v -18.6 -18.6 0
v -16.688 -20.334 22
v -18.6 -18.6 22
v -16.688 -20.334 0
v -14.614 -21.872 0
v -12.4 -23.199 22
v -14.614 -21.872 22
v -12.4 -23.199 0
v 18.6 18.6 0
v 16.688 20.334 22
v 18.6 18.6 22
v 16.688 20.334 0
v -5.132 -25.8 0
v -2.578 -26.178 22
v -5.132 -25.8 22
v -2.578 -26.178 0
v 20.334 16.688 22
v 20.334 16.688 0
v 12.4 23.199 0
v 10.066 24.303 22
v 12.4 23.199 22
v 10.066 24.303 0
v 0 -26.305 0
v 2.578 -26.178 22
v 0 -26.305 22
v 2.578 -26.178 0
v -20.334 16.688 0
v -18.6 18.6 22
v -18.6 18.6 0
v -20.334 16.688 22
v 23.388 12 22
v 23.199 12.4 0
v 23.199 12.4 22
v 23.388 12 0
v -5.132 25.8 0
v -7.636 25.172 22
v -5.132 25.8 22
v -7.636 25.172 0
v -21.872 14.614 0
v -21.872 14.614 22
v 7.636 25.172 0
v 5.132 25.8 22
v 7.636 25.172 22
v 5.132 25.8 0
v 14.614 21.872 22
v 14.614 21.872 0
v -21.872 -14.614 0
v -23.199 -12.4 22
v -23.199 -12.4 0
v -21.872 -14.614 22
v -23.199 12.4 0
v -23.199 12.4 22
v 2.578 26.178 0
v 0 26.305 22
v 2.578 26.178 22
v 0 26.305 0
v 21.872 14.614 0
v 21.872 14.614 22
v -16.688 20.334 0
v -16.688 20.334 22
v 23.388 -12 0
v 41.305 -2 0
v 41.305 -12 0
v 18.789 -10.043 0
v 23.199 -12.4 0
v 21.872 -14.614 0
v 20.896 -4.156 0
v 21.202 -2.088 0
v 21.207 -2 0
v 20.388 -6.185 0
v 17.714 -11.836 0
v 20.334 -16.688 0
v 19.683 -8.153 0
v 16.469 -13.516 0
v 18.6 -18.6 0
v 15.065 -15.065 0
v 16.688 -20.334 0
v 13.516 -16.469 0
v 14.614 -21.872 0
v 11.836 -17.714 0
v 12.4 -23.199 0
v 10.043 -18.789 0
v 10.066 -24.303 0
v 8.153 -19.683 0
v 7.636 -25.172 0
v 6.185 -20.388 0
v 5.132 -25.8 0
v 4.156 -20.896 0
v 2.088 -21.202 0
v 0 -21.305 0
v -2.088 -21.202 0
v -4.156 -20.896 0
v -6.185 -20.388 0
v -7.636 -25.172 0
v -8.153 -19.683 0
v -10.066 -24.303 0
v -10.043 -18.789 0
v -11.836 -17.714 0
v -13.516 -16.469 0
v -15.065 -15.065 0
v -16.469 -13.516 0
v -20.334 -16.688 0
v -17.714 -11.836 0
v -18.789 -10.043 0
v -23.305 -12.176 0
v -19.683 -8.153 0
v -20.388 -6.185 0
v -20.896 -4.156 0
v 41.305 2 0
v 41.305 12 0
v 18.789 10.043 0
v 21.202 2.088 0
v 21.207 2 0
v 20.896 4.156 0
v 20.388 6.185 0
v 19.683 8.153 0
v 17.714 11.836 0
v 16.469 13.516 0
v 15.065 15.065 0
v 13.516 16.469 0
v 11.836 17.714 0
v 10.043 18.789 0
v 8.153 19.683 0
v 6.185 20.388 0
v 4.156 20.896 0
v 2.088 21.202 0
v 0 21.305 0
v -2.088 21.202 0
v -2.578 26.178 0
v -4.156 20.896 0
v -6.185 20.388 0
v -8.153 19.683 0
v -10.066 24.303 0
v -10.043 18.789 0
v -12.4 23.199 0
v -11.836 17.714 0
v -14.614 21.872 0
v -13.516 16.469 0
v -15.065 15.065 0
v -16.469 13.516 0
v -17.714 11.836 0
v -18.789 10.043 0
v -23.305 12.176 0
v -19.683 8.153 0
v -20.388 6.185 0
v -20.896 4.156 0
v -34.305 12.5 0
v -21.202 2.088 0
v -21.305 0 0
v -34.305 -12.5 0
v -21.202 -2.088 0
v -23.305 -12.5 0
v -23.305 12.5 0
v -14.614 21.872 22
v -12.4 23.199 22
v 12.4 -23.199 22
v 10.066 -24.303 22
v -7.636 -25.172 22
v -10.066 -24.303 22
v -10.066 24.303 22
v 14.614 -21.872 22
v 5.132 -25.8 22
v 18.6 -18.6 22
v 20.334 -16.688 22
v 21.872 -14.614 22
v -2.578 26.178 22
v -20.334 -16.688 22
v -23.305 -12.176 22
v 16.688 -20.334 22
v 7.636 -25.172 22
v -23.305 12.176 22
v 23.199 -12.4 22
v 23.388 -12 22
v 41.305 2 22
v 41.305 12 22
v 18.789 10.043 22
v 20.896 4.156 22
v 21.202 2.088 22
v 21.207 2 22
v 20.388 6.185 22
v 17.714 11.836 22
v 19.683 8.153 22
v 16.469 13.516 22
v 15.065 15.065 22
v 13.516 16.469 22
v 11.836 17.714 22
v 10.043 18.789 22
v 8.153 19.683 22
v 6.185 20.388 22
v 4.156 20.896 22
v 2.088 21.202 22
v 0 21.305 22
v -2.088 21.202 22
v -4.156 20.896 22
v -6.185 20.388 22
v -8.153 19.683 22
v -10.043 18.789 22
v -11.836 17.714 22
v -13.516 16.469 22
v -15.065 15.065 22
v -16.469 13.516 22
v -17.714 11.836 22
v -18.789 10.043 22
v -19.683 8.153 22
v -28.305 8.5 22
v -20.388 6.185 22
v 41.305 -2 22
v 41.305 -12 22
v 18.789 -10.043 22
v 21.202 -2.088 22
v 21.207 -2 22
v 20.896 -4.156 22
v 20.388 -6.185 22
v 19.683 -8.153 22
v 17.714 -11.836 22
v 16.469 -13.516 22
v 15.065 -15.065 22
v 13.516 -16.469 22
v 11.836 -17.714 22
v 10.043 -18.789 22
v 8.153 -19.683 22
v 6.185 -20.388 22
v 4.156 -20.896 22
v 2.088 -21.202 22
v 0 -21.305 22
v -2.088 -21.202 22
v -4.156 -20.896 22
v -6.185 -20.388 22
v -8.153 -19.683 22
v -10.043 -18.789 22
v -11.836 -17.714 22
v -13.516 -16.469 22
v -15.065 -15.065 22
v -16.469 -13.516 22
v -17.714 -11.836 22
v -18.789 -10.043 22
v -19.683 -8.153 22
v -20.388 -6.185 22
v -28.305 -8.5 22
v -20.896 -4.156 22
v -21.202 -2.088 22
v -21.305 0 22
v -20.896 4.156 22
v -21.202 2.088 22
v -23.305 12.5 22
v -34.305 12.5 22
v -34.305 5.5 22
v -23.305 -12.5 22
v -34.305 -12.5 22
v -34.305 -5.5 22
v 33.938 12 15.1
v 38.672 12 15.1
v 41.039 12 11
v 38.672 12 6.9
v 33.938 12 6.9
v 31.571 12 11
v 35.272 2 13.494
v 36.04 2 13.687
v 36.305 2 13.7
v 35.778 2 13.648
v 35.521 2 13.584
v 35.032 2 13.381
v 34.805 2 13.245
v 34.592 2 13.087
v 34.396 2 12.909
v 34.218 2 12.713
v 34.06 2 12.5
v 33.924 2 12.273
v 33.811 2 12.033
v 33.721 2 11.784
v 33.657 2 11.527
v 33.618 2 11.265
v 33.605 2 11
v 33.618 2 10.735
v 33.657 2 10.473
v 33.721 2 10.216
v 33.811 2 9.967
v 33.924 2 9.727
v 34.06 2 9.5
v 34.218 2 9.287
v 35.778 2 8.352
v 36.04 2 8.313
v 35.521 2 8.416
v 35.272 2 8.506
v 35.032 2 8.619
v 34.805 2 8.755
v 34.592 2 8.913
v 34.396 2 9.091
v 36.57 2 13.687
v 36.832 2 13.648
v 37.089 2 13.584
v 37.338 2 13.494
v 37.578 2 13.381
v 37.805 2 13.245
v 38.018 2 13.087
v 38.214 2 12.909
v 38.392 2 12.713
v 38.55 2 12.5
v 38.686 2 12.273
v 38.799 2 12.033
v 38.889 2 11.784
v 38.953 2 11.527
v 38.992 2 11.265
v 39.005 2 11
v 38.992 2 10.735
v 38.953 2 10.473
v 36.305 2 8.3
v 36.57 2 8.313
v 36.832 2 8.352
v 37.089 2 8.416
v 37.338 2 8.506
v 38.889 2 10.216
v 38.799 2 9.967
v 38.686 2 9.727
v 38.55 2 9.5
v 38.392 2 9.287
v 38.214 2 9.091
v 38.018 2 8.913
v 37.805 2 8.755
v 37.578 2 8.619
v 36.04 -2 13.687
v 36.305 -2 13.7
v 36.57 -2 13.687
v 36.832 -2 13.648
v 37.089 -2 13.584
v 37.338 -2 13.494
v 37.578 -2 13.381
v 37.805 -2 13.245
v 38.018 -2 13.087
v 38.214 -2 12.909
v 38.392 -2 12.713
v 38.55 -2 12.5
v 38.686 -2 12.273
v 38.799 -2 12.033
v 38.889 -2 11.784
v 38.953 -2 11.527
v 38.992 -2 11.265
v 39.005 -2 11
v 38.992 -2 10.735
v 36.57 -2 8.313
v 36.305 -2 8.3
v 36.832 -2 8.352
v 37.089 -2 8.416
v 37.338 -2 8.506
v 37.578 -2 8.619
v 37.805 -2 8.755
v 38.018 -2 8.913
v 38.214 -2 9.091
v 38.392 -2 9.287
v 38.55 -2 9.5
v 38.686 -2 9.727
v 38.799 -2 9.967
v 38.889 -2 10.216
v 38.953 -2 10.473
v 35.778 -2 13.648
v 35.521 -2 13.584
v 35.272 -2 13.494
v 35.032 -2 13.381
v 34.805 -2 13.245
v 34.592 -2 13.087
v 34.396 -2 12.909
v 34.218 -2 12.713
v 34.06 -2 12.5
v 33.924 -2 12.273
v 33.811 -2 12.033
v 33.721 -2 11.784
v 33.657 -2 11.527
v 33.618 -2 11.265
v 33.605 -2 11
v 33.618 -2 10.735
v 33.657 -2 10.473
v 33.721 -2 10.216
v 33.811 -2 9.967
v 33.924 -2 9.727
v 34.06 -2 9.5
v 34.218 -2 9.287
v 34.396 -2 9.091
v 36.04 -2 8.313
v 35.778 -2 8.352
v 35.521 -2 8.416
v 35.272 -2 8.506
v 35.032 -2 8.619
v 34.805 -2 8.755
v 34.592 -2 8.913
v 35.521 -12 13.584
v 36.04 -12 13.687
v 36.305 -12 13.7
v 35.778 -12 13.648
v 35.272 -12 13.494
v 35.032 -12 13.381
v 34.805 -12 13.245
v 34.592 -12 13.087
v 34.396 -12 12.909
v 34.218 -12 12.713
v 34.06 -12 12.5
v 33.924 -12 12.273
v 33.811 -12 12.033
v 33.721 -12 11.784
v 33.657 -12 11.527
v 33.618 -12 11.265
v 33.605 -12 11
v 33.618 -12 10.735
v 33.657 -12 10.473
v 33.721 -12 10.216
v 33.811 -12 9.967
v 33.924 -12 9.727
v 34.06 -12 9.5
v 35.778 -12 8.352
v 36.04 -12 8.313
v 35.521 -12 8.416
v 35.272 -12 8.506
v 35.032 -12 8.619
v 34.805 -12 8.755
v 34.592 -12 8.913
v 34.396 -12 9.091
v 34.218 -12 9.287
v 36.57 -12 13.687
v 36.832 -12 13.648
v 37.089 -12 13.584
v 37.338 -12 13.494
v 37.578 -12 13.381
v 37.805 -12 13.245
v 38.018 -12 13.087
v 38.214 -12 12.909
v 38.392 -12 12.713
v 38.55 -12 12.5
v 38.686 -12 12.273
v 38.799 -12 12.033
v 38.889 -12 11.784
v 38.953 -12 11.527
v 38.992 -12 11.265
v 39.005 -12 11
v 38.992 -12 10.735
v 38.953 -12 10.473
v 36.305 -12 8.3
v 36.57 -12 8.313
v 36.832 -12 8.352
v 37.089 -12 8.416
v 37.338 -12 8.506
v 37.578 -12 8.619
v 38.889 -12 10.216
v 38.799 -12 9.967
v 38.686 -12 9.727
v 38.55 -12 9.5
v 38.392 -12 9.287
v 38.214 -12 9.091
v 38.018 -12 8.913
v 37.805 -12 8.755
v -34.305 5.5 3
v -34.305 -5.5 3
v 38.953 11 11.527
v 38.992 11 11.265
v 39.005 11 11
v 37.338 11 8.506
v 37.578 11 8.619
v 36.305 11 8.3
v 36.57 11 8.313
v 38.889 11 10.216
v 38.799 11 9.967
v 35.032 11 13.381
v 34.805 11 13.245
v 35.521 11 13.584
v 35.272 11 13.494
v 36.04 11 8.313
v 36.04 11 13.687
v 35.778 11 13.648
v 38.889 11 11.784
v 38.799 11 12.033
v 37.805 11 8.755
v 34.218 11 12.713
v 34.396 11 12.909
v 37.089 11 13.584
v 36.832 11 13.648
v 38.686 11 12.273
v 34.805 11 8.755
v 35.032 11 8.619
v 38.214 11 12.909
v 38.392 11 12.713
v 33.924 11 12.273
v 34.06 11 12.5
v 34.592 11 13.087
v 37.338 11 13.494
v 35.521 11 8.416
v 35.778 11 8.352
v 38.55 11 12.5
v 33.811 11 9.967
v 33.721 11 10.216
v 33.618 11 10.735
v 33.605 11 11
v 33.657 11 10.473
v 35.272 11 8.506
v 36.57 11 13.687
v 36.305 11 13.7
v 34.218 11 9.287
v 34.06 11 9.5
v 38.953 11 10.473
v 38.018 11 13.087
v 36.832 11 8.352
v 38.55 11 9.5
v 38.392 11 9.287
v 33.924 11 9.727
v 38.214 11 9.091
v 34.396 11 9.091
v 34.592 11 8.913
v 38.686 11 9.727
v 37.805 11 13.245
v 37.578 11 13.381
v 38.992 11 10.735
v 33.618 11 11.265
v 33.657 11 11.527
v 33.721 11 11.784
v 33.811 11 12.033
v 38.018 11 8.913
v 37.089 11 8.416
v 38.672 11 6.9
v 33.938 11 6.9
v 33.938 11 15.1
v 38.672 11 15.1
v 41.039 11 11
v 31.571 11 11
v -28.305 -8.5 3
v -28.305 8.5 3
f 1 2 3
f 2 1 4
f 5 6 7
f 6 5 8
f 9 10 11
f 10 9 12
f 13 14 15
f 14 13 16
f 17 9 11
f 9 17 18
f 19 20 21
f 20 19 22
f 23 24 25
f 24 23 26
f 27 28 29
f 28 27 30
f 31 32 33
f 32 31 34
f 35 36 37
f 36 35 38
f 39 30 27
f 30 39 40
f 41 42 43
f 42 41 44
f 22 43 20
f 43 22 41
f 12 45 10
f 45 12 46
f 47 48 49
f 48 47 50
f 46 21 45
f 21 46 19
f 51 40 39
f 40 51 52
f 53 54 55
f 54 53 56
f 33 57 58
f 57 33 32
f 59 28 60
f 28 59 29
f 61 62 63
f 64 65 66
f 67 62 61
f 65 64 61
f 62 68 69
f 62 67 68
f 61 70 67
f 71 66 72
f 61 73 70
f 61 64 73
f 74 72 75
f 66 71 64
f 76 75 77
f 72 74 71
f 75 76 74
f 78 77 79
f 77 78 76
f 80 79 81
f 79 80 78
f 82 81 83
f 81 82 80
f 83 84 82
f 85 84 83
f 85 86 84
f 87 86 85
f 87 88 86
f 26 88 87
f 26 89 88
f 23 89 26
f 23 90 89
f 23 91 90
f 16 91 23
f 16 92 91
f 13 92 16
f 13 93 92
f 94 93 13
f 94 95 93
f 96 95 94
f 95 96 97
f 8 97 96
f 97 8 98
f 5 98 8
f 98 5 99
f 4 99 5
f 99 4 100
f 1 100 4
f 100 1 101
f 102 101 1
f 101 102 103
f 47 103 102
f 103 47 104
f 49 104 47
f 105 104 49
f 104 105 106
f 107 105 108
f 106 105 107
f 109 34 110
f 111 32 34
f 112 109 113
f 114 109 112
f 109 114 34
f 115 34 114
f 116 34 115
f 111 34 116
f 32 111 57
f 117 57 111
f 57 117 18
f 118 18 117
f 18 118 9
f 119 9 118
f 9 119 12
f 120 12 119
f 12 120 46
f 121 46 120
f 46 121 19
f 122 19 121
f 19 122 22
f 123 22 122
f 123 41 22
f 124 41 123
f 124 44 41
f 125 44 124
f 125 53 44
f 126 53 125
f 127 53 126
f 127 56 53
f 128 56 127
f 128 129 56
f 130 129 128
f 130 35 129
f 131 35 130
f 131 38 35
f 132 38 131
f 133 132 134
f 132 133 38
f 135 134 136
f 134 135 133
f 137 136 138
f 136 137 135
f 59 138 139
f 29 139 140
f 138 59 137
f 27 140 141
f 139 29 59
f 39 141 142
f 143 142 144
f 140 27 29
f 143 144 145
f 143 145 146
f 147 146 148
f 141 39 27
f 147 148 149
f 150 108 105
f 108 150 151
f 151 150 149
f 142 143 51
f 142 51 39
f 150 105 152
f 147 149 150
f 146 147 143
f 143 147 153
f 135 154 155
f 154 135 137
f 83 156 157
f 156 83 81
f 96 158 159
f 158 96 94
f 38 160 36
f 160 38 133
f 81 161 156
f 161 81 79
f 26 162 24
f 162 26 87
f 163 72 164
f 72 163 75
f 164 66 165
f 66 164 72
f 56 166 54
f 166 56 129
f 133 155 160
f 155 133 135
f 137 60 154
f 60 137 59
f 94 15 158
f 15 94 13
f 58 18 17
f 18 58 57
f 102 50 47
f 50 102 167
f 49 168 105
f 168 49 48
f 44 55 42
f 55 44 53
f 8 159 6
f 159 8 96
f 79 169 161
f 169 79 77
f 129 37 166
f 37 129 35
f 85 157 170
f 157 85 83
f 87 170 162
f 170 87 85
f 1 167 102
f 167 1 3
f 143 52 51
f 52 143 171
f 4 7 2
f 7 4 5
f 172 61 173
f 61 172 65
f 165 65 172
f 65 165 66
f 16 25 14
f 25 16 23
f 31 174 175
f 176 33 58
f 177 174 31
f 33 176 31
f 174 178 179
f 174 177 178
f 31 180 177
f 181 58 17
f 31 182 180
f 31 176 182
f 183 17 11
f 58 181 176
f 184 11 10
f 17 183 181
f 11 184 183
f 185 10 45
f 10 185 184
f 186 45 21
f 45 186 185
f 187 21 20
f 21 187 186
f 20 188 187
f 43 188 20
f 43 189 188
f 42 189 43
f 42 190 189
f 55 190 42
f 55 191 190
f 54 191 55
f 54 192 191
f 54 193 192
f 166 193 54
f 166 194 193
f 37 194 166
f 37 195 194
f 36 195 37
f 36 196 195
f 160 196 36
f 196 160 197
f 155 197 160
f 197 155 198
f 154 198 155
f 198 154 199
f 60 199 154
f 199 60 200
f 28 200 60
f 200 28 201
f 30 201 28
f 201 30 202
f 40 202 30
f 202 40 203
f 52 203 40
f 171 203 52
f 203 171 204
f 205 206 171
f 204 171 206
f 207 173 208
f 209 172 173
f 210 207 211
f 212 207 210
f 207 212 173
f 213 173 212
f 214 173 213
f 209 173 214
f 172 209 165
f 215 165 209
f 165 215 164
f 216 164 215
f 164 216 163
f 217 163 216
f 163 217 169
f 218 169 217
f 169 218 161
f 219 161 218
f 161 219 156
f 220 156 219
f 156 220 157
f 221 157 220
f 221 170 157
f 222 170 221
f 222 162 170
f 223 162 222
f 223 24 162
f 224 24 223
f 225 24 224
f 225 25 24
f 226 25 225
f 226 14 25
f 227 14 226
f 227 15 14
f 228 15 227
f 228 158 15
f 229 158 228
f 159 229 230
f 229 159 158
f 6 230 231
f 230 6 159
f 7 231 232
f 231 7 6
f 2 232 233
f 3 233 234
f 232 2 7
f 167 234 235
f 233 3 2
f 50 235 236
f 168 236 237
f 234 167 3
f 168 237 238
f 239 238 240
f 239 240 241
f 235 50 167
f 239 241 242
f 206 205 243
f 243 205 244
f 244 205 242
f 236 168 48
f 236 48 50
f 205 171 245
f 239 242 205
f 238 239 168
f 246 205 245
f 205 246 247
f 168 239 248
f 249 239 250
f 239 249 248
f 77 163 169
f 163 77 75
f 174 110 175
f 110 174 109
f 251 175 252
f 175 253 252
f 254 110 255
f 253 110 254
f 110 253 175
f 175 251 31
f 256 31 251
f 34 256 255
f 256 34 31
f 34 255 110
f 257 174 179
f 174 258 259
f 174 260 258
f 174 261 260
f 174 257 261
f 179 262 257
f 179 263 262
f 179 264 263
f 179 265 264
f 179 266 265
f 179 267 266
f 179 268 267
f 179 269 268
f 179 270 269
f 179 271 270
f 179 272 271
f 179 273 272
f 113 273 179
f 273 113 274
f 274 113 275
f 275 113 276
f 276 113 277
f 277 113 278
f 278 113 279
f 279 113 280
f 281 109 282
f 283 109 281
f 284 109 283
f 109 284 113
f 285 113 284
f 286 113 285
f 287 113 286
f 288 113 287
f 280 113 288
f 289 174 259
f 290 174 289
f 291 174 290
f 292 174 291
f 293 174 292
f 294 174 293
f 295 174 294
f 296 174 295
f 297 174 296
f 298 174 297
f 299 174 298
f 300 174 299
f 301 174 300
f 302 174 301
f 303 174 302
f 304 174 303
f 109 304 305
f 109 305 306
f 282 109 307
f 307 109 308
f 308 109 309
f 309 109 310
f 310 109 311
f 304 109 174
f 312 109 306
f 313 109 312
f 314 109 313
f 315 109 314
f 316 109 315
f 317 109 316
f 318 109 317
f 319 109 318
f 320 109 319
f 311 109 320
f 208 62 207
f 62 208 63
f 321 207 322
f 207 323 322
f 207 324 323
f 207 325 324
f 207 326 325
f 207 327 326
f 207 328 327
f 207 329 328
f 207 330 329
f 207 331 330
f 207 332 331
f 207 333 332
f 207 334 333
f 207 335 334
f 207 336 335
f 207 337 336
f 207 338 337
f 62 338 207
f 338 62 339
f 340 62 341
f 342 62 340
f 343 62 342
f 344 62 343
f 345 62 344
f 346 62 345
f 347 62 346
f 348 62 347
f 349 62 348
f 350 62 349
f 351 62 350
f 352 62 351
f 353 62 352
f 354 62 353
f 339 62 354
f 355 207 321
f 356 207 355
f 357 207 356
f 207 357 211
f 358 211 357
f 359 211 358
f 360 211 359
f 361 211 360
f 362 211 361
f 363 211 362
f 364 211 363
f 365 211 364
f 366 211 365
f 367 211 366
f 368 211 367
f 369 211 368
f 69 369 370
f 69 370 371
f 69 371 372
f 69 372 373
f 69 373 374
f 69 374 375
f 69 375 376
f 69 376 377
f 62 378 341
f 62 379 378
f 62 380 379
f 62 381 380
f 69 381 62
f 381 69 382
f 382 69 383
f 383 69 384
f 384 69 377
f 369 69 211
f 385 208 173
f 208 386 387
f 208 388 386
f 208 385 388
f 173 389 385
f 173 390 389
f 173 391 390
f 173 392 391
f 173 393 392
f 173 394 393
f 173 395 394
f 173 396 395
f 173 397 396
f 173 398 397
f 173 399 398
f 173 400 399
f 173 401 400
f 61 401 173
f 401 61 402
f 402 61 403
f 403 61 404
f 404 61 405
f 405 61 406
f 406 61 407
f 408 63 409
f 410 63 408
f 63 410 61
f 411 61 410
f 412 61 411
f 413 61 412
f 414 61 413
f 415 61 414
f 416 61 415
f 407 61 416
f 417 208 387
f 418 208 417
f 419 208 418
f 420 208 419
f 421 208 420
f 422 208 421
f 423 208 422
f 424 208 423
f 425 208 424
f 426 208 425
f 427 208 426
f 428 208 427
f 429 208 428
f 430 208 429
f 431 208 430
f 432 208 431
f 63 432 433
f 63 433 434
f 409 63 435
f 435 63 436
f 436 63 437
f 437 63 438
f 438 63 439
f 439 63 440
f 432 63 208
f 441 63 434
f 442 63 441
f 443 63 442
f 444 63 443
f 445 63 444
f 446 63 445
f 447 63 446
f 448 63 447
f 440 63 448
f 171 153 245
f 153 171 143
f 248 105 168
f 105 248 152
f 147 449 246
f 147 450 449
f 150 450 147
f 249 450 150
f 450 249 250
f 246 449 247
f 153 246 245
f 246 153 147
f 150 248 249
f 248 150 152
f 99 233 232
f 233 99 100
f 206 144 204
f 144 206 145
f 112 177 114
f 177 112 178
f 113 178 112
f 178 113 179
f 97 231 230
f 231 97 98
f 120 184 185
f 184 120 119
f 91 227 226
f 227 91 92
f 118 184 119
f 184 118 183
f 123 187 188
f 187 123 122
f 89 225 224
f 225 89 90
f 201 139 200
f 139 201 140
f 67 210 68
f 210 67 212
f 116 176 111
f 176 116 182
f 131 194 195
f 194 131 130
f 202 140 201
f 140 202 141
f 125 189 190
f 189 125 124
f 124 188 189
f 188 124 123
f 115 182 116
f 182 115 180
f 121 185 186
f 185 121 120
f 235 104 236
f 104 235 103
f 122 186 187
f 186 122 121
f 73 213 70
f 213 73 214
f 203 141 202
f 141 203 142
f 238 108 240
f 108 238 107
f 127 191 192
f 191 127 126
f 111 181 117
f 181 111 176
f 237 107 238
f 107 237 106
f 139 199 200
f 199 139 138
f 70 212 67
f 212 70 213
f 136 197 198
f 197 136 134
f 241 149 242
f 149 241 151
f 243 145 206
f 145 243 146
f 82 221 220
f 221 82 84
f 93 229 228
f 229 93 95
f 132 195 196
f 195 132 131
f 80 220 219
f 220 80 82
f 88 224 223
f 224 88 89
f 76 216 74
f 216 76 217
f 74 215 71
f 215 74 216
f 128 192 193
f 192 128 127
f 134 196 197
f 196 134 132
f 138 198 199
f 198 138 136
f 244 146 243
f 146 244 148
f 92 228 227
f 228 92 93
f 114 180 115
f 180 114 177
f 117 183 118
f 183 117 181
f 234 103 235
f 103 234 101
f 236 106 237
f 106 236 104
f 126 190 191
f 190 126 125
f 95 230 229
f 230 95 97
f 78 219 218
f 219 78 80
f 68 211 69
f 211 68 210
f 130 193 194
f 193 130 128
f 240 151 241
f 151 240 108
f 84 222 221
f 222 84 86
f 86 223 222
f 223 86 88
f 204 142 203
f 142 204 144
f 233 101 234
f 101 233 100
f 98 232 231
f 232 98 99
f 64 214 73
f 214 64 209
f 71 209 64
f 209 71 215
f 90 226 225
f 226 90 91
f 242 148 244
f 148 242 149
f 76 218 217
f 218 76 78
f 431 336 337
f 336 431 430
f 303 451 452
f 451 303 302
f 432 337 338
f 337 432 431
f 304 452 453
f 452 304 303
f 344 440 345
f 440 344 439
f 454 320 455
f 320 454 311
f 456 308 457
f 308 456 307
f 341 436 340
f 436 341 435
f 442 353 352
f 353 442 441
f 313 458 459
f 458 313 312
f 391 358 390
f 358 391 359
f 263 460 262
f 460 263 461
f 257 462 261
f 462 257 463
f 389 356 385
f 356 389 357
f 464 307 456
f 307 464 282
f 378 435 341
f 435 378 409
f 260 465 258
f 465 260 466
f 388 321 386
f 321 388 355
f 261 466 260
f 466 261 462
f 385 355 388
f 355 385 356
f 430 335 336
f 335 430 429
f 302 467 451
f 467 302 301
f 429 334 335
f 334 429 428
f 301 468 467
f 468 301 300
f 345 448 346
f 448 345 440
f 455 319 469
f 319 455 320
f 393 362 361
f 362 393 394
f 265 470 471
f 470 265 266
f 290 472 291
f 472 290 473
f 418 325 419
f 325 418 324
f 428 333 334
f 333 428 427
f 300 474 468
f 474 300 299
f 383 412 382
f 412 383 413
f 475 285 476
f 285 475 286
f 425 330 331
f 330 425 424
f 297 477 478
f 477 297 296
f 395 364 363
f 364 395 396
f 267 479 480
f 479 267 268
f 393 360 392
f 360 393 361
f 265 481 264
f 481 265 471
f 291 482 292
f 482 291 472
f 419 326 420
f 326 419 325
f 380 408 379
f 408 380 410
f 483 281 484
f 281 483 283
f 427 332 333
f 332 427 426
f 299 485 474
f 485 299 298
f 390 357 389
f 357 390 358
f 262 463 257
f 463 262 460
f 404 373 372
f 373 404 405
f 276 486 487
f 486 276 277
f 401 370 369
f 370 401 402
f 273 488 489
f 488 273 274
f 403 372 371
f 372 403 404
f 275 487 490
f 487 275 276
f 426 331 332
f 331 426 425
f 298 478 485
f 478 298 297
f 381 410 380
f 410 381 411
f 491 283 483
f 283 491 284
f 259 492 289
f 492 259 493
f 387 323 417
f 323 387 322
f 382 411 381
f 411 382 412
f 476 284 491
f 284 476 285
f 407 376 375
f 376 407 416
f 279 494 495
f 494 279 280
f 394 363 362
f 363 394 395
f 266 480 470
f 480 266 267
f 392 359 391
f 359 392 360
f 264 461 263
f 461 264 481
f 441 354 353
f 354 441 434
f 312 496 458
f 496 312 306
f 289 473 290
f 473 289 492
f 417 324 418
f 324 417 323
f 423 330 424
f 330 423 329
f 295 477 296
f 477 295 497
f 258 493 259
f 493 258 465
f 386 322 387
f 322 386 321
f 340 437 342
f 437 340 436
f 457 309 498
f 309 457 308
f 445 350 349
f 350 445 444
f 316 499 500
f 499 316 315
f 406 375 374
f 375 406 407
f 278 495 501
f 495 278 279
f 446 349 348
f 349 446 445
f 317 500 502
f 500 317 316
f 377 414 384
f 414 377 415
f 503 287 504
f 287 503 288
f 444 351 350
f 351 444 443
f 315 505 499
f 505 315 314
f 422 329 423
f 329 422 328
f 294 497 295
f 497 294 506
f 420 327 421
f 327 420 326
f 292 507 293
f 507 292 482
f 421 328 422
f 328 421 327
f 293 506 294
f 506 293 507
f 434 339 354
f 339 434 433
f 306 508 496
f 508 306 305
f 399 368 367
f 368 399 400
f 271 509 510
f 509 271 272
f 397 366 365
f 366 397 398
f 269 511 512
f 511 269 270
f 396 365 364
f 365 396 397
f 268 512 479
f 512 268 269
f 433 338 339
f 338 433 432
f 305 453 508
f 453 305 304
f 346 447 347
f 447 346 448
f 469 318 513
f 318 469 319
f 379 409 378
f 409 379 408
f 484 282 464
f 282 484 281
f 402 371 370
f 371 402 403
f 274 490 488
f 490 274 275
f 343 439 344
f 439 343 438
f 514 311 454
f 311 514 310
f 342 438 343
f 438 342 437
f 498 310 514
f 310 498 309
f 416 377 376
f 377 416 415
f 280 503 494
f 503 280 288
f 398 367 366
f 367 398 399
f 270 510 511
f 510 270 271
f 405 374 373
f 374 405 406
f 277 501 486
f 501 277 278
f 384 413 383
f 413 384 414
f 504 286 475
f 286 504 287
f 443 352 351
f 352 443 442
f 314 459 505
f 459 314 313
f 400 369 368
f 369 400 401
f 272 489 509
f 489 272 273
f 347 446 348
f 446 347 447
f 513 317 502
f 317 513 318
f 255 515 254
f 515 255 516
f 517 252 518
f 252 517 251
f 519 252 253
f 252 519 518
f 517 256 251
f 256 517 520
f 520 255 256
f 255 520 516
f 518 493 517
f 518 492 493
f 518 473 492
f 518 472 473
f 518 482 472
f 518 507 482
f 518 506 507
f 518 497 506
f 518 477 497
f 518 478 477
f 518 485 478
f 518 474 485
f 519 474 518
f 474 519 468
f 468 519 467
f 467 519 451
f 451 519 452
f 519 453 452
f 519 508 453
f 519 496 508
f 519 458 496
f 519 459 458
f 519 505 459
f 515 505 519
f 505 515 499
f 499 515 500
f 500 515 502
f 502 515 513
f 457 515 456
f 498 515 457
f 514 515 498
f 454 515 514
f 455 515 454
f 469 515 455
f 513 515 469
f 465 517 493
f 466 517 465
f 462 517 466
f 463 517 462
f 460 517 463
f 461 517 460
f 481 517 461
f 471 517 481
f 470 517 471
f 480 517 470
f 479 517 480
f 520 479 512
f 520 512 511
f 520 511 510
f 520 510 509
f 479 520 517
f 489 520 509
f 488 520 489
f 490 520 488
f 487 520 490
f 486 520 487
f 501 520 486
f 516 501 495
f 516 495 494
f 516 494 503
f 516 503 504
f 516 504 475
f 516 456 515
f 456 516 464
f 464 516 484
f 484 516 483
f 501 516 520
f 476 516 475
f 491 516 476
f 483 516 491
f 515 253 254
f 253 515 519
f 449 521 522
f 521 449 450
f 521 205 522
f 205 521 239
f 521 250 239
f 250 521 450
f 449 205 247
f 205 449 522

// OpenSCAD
// file: stand_cable_clamp_common.scad
// stand_cable_clamp_common.scad — modular cable clamp for round stand poles.
//
// A split C-clamp pops over the pole and an M5 bolt + wingnut cinches it tight
// (the bolt head is captured in a hex pocket, so you only turn the wingnut —
// tool-free reposition). A dovetail on the clamp face takes slide-on cable
// heads, so one clamp accepts any attachment.
//
//   clamp(tube_d)   — the pole clamp (set tube_d to your pole OD)
//   head_hook()     — open J-hook
//   head_clip()     — snap cable clip
//   head_comb()     — multi-cable comb
//   head_velcro()   — velcro-strap slot
//
// On-Stage SS8800B+ measured diameters: upper shaft ≈ 34.9 mm (1⅜") / 38.1 mm
// (1½" w/ sleeve), tripod legs 35.38 mm, crank-up column 41.41 mm. Variant files
// clamp_leg.scad (35.38) and clamp_column.scad (41.41) cover the latter two.

TUBE_D = 35;        // pole outer diameter (set per stand)
CLEAR  = 0.6;       // clamp bore clearance
WALL   = 5;         // clamp wall
H      = 22;        // clamp height (along the pole)
GAP    = 4;         // split-gap width
EAR_L  = 18; EAR_W = 10;
BOLT_D = 5.4;       // M5 clearance
HEX_AF = 8.2;       // M5 hex head/nut across-flats (capture pocket)
HEX_T  = 4.5;

// dovetail (undercut: mouth narrower than back so the head can't pull out)
DT_MOUTH = 11; DT_BACK = 17; DT_DEPTH = 6; DT_H = 18; DT_STOP = 3; DT_CLEAR = 0.5;
CABLE_D = 8;        // nominal cable diameter for clip/comb

$fn = 64;

// dovetail solid: mouth (narrow) at x=0 facing -X, widening to back at x=depth, extruded up Z
module dt_prism(mouth, back, depth, h) {
    linear_extrude(h) polygon([[0, -mouth/2], [0, mouth/2], [depth, back/2], [depth, -back/2]]);
}
module dt_tongue() { dt_prism(DT_MOUTH - DT_CLEAR, DT_BACK - DT_CLEAR, DT_DEPTH - 0.3, DT_H); }

// ---- clamp ----
module clamp(tube_d = TUBE_D) {
    ir = tube_d / 2 + CLEAR; orr = ir + WALL;
    boss_x = -orr - DT_DEPTH - 2;        // -X outer face of the dovetail boss
    difference() {
        union() {
            cylinder(h = H, r = orr);
            translate([orr - 3, GAP / 2, 0]) cube([EAR_L, EAR_W, H]);            // +Y ear
            translate([orr - 3, -GAP / 2 - EAR_W, 0]) cube([EAR_L, EAR_W, H]);   // -Y ear
            translate([boss_x, -(DT_BACK / 2 + 4), 0]) cube([DT_DEPTH + 5, DT_BACK + 8, H]); // dovetail boss
        }
        translate([0, 0, 0]) cylinder(h = 3 * H, r = ir, center = true);         // bore
        translate([0, -GAP / 2, -1]) cube([orr + EAR_L + 5, GAP, H + 2]);        // split slot
        // wingnut bolt through the ears (along Y)
        translate([orr + EAR_L - 8, GAP / 2 + EAR_W + 3, H / 2]) rotate([90, 0, 0]) cylinder(h = 2 * EAR_W + GAP + 8, d = BOLT_D);
        // hex pocket captures the bolt head on the +Y ear outer face
        translate([orr + EAR_L - 8, GAP / 2 + EAR_W + HEX_T, H / 2]) rotate([90, 0, 0]) cylinder(h = HEX_T + 1, d = HEX_AF / cos(30), $fn = 6);
        // dovetail socket groove (open top, solid below DT_STOP as a slide stop)
        translate([boss_x, 0, DT_STOP]) dt_prism(DT_MOUTH, DT_BACK, DT_DEPTH, H);
    }
}

// ---- heads (universal; mount via the dovetail tongue at x=0..DT_DEPTH) ----
module _backplate(t = 4) { translate([-t, -DT_BACK / 2, 0]) cube([t, DT_BACK, DT_H]); }

module head_hook() {
    dt_tongue(); _backplate();
    translate([-4, 0, DT_H / 2]) rotate([90, 0, 0])
        rotate_extrude(angle = 250) translate([16, 0]) circle(d = 7);
}
module head_clip(clip_w = 12) {
    dt_tongue(); _backplate();
    // C-clip (vertical cable), ring connects to the backplate on +X, mouth opens -X
    ring_out = CABLE_D + 5;
    translate([-4 - ring_out / 2 + 1.5, 0, (DT_H - clip_w) / 2])
        linear_extrude(clip_w) difference() {
            circle(d = ring_out);
            circle(d = CABLE_D + 0.7);
            translate([-ring_out, -(CABLE_D - 1.5) / 2]) square([ring_out, CABLE_D - 1.5]); // snap mouth (-X)
        }
}
module head_comb(n = 4) {
    dt_tongue(); _backplate();
    bar_w = n * (CABLE_D + 3) + 3;
    translate([-4 - 8, -bar_w / 2, 0]) difference() {
        cube([10, bar_w, DT_H]);
        for (i = [0 : n - 1]) translate([-1, 3 + i * (CABLE_D + 3) + CABLE_D / 2, DT_H]) rotate([0, 90, 0]) cylinder(d = CABLE_D, h = 12); // open-top slots
        for (i = [0 : n - 1]) translate([-1, 3 + i * (CABLE_D + 3) + CABLE_D / 2, DT_H - CABLE_D / 2]) cube([12, CABLE_D, CABLE_D]);
    }
}
module head_velcro(strap_w = 25, strap_t = 3) {
    dt_tongue(); _backplate();
    translate([-4 - 6, -(strap_w + 8) / 2, 0]) difference() {
        cube([6, strap_w + 8, DT_H]);
        translate([-1, 4, DT_H / 2 - strap_t / 2]) cube([8, strap_w, strap_t]); // strap thru-slot
    }
}
// main file
// clamp_column — On-Stage SS8800B+ crank-up column (OD 41.41 mm).
include <stand_cable_clamp_common.scad>
clamp(tube_d = 41.41);
